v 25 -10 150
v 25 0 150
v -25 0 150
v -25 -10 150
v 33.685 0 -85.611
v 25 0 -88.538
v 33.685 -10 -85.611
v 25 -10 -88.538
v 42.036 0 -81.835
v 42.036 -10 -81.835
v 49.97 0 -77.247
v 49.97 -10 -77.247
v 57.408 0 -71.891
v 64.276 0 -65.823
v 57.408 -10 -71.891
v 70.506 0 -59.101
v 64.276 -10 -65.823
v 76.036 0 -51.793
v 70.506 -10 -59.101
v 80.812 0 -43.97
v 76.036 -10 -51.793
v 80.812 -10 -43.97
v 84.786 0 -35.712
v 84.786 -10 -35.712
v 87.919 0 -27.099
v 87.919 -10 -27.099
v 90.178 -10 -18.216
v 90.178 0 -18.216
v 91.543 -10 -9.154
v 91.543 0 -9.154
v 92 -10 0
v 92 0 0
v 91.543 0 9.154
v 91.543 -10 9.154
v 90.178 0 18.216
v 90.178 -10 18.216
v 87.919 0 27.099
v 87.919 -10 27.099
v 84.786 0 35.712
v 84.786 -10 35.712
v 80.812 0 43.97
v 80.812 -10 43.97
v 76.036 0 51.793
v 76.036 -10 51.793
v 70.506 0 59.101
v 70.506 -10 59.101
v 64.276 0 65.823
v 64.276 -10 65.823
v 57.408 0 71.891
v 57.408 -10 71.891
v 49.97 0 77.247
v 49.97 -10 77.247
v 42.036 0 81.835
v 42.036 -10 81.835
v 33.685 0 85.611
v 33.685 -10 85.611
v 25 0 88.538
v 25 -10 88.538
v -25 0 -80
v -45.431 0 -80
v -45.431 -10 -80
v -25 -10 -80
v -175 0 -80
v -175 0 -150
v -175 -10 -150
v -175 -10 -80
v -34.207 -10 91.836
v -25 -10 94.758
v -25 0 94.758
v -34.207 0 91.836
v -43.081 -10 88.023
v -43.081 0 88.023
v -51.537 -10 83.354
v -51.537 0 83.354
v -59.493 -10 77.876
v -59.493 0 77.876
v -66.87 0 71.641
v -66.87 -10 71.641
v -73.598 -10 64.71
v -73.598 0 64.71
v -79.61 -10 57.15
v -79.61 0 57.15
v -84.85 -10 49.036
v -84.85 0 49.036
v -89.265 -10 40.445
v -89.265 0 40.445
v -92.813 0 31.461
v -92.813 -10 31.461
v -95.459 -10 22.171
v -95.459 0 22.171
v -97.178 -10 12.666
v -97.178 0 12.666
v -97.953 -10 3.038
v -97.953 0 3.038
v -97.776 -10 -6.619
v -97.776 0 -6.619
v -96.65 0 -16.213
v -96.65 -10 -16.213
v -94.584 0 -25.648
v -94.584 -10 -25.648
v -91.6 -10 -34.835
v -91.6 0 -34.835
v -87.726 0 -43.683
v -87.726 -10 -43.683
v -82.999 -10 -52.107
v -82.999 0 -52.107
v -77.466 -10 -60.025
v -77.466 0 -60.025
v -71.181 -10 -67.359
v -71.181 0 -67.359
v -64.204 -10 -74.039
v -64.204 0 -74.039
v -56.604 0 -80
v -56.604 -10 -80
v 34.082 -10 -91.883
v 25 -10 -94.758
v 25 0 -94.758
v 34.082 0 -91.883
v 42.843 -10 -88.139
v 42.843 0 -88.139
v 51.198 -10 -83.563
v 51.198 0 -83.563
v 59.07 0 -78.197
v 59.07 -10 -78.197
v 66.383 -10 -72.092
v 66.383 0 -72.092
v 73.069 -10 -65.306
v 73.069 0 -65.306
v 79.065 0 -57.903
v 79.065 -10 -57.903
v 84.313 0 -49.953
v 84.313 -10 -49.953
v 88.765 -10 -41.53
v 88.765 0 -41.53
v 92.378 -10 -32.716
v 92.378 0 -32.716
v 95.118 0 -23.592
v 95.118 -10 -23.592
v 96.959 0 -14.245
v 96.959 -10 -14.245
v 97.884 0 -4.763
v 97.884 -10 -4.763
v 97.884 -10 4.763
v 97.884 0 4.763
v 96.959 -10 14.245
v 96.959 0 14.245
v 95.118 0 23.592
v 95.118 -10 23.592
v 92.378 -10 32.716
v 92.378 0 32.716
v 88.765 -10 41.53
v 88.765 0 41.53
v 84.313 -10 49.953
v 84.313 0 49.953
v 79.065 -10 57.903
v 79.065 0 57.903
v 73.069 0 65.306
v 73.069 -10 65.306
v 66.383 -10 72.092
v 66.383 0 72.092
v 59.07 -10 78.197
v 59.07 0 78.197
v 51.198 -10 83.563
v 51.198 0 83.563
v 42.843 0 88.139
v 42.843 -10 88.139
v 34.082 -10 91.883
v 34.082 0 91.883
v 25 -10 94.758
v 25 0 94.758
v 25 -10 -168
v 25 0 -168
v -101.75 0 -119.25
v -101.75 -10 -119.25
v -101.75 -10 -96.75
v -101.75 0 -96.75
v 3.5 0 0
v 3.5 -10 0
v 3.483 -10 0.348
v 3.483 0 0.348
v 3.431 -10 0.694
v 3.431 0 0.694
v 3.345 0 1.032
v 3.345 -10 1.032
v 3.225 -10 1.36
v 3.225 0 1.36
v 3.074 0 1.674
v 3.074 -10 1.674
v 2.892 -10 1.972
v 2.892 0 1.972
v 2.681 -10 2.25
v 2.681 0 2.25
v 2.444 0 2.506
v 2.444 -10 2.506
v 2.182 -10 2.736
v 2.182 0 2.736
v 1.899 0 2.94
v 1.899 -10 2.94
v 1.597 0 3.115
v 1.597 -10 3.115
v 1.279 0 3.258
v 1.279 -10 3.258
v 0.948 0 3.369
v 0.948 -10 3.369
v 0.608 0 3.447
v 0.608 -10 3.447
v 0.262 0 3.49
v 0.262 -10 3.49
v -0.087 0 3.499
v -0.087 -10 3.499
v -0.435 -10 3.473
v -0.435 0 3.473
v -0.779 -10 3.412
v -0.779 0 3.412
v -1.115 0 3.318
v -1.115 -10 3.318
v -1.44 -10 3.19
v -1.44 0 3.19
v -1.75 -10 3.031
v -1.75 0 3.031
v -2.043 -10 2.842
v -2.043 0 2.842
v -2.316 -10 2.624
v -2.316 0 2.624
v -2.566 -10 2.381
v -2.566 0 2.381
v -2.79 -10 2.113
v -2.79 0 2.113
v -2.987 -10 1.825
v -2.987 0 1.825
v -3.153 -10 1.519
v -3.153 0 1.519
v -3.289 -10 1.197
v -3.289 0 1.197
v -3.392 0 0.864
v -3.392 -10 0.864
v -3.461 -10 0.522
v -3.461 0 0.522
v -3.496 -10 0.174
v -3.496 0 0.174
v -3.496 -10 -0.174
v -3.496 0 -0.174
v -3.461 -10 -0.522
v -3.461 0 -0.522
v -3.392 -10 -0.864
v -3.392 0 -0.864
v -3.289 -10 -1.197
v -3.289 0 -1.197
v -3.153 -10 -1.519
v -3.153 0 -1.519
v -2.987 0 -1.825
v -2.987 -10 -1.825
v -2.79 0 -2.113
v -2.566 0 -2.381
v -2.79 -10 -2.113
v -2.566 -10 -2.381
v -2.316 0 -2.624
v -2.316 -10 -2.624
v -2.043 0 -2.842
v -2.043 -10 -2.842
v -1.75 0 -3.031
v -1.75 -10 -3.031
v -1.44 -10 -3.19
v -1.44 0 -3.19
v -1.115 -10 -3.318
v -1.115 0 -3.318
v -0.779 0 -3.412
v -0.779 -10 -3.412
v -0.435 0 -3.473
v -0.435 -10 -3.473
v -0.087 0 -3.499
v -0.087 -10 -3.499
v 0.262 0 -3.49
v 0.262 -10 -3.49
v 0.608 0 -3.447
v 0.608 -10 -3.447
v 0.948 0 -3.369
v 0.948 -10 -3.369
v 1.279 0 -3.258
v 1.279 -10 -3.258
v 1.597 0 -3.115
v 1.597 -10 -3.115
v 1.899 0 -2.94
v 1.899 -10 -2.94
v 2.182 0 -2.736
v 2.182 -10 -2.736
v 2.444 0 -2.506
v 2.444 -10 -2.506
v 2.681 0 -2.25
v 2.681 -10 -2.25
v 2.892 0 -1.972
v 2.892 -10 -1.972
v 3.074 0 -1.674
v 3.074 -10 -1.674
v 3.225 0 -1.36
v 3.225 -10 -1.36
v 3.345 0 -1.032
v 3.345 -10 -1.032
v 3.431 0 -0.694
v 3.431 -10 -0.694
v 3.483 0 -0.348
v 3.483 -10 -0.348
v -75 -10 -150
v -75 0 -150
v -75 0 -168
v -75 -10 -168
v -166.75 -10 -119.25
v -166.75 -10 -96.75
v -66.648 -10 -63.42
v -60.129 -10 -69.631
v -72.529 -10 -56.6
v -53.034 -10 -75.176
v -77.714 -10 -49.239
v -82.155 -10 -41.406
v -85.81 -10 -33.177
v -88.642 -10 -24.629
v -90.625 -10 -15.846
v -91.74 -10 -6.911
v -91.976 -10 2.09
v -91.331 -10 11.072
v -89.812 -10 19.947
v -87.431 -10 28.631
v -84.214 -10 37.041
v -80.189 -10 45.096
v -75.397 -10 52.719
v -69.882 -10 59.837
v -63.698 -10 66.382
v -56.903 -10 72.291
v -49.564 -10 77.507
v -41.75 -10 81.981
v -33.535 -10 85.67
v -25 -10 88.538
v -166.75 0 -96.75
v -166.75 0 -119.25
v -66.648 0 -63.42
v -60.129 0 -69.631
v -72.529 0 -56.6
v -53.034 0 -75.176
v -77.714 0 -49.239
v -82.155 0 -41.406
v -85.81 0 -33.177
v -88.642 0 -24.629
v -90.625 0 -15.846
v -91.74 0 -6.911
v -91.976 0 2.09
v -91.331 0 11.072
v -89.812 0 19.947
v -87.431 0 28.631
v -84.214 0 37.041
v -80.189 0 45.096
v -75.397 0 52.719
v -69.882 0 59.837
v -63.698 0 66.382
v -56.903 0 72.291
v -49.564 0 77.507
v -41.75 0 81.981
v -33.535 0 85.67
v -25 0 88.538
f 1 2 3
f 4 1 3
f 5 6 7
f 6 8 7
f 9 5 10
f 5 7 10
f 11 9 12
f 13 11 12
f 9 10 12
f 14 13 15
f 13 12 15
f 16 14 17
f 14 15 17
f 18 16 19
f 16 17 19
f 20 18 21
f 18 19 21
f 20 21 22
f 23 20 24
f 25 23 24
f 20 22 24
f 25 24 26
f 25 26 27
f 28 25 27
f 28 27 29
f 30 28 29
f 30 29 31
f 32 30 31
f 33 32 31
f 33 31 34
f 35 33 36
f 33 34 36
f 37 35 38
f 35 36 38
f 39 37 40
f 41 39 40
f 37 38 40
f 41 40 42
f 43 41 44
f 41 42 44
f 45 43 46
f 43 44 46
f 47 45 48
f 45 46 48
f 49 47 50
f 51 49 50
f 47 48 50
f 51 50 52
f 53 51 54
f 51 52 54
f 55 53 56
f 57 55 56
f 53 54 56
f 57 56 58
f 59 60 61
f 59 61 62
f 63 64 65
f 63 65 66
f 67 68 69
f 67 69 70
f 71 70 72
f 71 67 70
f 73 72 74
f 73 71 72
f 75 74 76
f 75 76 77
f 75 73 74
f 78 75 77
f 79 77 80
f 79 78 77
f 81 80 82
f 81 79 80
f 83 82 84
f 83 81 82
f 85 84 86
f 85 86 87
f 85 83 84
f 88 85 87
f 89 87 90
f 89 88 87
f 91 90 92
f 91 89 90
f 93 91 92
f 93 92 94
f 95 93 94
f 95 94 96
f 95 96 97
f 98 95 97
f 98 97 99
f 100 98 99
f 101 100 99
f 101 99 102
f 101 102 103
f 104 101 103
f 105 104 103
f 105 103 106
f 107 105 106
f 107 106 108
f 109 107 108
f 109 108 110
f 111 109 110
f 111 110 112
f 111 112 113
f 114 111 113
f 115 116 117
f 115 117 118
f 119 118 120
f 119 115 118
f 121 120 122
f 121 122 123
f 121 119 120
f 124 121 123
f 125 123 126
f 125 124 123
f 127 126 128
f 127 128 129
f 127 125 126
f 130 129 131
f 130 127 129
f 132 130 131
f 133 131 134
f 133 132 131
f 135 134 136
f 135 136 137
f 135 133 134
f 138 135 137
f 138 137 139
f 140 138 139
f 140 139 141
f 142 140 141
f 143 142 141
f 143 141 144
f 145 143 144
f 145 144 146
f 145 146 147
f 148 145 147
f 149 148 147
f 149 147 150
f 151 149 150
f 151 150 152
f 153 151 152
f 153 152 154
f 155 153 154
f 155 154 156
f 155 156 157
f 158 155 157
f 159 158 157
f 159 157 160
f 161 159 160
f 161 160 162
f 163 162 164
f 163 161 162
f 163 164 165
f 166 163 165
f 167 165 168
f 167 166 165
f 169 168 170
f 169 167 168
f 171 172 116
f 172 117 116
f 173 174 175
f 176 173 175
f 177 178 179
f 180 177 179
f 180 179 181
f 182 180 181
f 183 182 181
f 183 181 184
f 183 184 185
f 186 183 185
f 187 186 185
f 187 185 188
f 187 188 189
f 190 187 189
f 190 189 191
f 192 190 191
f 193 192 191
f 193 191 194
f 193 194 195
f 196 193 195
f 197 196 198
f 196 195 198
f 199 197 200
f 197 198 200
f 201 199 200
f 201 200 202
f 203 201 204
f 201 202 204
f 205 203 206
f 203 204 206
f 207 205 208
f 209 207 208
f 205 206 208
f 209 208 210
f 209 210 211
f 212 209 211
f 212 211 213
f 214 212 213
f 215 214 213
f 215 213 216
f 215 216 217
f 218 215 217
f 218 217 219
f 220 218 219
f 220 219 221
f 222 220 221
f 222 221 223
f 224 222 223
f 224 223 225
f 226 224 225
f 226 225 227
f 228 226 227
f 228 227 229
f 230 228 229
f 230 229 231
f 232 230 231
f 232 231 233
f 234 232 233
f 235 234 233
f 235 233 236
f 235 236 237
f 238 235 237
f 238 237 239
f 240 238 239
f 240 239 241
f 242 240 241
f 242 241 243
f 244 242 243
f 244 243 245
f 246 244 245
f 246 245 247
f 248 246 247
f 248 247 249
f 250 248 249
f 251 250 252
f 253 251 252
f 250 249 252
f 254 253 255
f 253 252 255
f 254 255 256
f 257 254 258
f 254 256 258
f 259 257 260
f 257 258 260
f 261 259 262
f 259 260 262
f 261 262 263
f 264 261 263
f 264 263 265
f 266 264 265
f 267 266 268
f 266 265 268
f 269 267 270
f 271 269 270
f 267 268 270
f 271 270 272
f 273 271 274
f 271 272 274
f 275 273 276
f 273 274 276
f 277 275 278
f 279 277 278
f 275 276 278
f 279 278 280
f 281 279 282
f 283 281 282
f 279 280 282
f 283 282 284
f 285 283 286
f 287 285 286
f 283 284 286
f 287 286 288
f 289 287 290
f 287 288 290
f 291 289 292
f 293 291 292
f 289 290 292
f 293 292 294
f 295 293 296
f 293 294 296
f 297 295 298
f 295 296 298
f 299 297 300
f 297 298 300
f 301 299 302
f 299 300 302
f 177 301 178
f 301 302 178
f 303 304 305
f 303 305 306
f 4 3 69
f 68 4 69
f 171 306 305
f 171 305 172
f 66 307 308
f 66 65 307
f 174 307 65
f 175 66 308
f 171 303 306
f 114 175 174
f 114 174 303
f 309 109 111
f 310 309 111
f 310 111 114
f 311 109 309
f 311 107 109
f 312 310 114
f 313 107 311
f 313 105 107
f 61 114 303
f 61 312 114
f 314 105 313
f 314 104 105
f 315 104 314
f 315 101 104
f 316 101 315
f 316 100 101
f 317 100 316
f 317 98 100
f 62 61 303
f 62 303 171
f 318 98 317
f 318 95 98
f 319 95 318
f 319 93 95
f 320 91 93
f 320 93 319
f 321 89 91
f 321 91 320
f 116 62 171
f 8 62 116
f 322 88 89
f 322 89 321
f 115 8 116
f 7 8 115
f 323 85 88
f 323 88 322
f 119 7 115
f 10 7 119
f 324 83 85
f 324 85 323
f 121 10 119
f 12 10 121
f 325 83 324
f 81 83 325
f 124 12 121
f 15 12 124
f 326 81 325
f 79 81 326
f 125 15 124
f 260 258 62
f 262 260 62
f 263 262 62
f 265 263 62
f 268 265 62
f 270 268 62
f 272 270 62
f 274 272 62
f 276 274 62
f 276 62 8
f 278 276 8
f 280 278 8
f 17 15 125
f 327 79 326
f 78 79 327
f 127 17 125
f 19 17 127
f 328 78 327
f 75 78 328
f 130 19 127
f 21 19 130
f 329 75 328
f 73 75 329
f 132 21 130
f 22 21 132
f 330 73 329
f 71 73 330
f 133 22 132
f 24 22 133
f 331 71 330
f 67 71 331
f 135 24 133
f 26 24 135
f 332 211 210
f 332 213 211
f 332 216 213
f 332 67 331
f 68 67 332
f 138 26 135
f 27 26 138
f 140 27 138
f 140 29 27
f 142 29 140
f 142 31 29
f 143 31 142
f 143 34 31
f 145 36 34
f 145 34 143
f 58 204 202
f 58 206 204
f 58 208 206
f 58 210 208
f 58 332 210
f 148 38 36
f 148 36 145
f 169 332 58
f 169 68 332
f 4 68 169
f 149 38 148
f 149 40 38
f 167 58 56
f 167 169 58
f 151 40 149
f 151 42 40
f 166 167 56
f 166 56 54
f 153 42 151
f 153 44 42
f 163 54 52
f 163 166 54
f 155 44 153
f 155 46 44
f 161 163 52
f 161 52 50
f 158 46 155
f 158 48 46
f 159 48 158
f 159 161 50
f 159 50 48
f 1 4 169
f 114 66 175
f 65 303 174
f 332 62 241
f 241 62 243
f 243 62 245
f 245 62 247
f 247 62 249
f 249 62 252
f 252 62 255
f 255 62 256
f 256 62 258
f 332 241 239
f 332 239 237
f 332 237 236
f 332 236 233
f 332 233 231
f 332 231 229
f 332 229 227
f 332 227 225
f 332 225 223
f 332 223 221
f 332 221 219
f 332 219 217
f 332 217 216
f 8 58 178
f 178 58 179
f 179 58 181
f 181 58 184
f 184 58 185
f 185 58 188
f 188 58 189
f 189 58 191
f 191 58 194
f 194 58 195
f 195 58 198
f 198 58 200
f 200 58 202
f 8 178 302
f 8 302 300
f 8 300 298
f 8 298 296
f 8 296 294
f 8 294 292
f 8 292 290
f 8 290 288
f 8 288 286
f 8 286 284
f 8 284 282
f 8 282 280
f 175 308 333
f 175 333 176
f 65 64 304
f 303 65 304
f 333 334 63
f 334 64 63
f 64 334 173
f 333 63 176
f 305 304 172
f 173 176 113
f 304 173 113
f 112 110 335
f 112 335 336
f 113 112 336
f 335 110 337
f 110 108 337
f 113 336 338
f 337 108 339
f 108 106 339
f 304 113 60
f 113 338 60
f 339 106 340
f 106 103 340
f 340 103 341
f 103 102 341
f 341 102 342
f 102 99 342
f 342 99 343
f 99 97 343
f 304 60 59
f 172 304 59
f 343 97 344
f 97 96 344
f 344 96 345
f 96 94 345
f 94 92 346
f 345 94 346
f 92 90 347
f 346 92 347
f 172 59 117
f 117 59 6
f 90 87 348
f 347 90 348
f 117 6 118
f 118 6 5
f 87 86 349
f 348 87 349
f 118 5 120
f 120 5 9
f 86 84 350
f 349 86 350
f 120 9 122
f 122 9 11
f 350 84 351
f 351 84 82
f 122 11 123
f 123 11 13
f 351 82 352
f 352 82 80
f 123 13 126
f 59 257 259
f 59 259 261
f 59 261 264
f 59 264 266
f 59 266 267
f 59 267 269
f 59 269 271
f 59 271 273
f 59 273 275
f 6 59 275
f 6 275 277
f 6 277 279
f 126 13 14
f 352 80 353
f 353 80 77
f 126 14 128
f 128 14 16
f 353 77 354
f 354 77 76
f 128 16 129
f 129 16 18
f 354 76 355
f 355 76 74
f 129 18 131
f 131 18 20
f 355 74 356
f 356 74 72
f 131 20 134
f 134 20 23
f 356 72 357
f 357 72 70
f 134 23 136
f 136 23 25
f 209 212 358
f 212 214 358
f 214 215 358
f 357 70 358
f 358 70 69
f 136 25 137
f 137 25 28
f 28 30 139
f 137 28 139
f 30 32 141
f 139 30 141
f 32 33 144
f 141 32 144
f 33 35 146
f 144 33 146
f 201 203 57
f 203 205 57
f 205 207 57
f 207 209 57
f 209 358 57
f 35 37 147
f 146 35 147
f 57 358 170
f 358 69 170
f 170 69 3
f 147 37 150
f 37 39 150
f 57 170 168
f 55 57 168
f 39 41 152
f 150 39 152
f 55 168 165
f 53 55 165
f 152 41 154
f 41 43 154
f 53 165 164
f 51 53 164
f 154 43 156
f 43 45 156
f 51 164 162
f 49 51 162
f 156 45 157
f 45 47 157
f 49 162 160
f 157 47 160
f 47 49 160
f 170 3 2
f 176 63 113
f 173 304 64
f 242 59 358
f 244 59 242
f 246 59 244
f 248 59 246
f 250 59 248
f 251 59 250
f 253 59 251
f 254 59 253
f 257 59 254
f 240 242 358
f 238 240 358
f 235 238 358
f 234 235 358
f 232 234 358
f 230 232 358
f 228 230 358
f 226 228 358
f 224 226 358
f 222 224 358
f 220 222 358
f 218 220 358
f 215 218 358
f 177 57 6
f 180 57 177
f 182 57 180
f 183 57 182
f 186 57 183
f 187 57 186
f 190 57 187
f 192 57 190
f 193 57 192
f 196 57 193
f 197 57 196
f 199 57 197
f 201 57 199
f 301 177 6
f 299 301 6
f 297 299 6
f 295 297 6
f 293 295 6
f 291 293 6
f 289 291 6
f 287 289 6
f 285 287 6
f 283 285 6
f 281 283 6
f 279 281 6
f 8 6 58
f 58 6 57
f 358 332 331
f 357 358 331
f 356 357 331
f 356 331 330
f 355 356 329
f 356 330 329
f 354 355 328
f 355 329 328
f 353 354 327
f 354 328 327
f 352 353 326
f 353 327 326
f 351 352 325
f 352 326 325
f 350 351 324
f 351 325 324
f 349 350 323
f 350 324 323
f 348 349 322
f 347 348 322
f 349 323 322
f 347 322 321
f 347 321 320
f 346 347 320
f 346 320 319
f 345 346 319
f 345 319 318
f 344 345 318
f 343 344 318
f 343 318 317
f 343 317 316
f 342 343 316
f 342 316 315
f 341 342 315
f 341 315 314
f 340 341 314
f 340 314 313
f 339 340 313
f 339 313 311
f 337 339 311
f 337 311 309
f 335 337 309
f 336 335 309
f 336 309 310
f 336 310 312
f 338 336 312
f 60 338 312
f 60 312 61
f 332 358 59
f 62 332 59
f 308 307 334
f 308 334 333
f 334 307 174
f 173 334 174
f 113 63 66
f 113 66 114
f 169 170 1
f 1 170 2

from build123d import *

# Parameters (mm, degrees)
F0_W      = 150
F0_H      = 70
F1_DEPTH  = 10
F2_R      = 98
F2_R_2    = 92
F3_DEPTH  = 10
F4_W      = 100
F4_H      = 10
F5_DEPTH  = 18
F6_R      = 3.5
F7_DEPTH  = 25
F8_R      = 3.5
F9_DEPTH  = 25
F10_W     = 65
F10_H     = 22.5
F11_DEPTH = 25


with BuildPart() as f1:
    # F0 (on Front) → F1 (new body)
    with BuildSketch(Plane.XZ):
        Polygon((25, 150), (-25, 150), (-25, -80), (-25, -150), (25, -150), align=None)
        with Locations((-100, -115)):
            Rectangle(F0_W, F0_H)
    extrude(amount=F1_DEPTH)

    # F2 (on face) → F3 (join)
    with BuildSketch(Plane.XZ.offset(10)):
        Circle(F2_R)
        Circle(F2_R_2, mode=Mode.SUBTRACT)
    extrude(amount=-F3_DEPTH)

    # F4 (on face) → F5 (join)
    with BuildSketch(Plane(origin=(0, 0, -150), x_dir=(1, 0, 0), z_dir=(0, 0, -1))):
        with Locations((-25, 5)):
            Rectangle(F4_W, F4_H)
    extrude(amount=F5_DEPTH)

    # F6 (on face) → F7 (cut)
    with BuildSketch(Plane.XZ.offset(10)):
        Circle(F6_R)
    extrude(amount=-F7_DEPTH, mode=Mode.SUBTRACT)

    # F8 (on face) → F9 (cut)
    with BuildSketch(Plane.XZ.offset(10)):
        with Locations((-113, -108)):
            Circle(F8_R)
    extrude(amount=-F9_DEPTH, mode=Mode.SUBTRACT)

    # F10 (on face) → F11 (cut)
    with BuildSketch(Plane.XZ.offset(10)):
        with Locations((-134.25, -108)):
            Rectangle(F10_W, F10_H)
    extrude(amount=-F11_DEPTH, mode=Mode.SUBTRACT)


solid = f1.part
